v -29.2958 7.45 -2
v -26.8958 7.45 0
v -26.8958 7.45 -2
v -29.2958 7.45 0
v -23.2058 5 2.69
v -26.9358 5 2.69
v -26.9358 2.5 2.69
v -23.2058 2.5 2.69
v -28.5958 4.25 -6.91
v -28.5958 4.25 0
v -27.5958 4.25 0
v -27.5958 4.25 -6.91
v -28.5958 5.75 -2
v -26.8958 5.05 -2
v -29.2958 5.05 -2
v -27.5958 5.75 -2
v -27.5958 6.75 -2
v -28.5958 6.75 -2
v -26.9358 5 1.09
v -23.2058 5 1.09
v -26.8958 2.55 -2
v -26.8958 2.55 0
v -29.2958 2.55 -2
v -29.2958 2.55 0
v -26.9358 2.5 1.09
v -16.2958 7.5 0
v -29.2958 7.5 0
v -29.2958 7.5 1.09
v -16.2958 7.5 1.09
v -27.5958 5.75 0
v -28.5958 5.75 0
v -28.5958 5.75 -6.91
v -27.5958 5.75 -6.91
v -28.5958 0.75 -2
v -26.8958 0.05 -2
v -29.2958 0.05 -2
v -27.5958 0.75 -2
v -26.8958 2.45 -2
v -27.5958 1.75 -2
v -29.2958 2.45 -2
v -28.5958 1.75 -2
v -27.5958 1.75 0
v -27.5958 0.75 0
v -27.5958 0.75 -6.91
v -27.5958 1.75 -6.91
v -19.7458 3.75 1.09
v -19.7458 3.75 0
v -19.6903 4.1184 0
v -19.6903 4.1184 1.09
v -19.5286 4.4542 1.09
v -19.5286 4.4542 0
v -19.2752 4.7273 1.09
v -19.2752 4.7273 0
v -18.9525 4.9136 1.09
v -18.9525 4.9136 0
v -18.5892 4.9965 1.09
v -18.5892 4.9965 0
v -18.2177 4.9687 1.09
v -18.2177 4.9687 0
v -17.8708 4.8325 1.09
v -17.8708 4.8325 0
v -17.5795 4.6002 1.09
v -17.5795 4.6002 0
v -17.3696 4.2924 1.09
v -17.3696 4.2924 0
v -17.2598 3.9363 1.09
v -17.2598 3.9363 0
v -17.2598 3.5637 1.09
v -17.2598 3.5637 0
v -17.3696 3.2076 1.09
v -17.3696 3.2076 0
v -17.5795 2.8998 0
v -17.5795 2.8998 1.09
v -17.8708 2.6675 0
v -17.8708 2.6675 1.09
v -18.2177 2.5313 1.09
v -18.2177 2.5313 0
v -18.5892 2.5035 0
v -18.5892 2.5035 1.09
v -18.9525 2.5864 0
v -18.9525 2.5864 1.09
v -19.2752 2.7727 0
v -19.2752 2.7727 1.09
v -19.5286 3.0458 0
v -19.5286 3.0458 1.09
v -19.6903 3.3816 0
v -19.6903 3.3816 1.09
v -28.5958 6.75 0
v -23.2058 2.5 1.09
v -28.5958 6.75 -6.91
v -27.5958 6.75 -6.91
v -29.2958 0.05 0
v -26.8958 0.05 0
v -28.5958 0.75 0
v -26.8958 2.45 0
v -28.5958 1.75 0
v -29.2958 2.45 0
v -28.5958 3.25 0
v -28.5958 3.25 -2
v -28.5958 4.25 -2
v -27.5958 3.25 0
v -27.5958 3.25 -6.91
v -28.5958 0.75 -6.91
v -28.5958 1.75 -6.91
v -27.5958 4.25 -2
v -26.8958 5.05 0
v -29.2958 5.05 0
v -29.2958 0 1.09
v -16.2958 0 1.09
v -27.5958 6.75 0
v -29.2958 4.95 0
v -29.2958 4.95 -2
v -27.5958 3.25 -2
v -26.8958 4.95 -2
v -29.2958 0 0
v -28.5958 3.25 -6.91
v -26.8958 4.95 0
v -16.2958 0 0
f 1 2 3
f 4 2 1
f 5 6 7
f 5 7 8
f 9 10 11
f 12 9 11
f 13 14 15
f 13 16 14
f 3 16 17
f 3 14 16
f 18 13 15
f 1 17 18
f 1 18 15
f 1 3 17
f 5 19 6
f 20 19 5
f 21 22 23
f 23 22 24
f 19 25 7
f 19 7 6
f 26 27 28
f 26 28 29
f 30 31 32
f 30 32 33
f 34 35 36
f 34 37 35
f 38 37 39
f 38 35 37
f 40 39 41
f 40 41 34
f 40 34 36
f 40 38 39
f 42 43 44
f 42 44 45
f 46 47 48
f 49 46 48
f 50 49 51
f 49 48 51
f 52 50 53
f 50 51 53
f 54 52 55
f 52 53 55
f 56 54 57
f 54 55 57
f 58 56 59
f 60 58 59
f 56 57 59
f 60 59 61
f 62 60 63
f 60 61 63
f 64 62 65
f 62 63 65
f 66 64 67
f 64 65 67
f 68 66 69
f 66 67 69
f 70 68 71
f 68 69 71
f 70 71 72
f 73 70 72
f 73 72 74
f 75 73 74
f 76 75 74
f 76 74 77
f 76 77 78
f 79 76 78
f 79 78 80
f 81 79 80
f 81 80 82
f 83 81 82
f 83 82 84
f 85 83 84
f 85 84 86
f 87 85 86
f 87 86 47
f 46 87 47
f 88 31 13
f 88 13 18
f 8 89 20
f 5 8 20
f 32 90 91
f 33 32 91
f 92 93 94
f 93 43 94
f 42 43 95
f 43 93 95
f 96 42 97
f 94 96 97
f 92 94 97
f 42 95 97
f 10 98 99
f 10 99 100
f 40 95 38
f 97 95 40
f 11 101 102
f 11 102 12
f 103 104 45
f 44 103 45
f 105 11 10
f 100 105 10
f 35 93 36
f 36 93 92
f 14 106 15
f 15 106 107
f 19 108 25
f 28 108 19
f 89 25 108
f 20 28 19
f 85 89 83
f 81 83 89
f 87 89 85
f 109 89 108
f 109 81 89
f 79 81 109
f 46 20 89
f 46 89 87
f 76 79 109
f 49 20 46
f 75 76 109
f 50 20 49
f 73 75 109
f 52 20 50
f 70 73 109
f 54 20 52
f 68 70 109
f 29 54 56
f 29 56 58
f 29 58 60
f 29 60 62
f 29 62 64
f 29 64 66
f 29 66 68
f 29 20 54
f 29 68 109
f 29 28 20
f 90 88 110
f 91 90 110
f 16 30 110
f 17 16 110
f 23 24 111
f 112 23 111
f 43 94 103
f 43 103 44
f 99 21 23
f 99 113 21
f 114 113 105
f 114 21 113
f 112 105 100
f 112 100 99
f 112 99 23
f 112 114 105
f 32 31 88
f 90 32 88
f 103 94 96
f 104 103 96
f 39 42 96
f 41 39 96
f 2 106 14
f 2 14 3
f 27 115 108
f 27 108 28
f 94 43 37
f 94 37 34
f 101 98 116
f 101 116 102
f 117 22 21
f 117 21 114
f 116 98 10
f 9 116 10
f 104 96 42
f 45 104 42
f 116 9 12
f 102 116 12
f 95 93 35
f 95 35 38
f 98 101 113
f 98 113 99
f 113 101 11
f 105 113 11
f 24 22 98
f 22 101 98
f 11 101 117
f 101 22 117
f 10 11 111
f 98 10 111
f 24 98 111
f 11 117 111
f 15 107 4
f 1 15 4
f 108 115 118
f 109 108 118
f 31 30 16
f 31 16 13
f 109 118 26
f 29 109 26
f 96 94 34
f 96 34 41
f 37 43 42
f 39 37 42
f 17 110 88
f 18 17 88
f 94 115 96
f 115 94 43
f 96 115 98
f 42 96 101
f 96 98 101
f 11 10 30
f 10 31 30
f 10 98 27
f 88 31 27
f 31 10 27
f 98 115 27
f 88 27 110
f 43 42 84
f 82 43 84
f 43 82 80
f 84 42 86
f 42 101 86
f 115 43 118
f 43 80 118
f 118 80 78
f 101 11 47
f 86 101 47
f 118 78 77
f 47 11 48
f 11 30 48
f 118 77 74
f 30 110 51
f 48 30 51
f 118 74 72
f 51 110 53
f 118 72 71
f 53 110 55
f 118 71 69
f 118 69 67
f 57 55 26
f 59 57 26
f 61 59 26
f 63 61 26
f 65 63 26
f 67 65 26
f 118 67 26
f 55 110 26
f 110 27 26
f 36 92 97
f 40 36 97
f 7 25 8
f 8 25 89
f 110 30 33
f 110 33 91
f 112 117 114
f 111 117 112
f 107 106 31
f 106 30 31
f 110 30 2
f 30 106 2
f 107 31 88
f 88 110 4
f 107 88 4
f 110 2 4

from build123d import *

# Parameters (mm, degrees)
ESQUISSE1_W             = 13
ESQUISSE1_H             = 7.5
BOSS_EXTRU_3_DEPTH      = 1.09
ESQUISSE4_W             = 3.73
ESQUISSE4_H             = 2.5
BOSS_EXTRU_4_DEPTH      = 1.6
ESQUISSE5_W             = 1
ESQUISSE5_H             = 1
BOSS_EXTRU_5_DEPTH      = 8
ESQUISSE6_W             = 2.4
ESQUISSE6_H             = 2.4
ESQUISSE6_W_2           = 1
ESQUISSE6_H_2           = 1
BOSS_EXTRU_6_DEPTH      = 2
BOSS_EXTRU_6_2_DEPTH    = 2
BOSS_EXTRU_6_3_DEPTH    = 2
ESQUISSE7_R             = 1.25
ENL_V_MAT_EXTRU_1_DEPTH = 32.020050982


with BuildPart() as part:
    # Esquisse1 → Boss.-Extru.3 (new body)
    with BuildSketch(Plane.XY):
        with Locations((-22.795826716, 3.75)):
            Rectangle(ESQUISSE1_W, ESQUISSE1_H)
    extrude(amount=BOSS_EXTRU_3_DEPTH)

    # Esquisse4 → Boss.-Extru.4 (add)
    with BuildSketch(Plane.XY.offset(1.09)):
        with Locations((-25.070826716, 3.75)):
            Rectangle(ESQUISSE4_W, ESQUISSE4_H)
    extrude(amount=BOSS_EXTRU_4_DEPTH)

    # Esquisse5 → Boss.-Extru.5 (add)
    with BuildSketch(Plane.XY.offset(1.09)):
        with Locations((-28.095826716, 6.25)):
            Rectangle(ESQUISSE5_W, ESQUISSE5_H)
        with Locations((-28.095826716, 3.75)):
            Rectangle(ESQUISSE5_W, ESQUISSE5_H)
        with Locations((-28.095826716, 1.25)):
            Rectangle(ESQUISSE5_W, ESQUISSE5_H)
    extrude(amount=-BOSS_EXTRU_5_DEPTH)

    # Esquisse7 → Enlèv. mat.-Extru.1 (cut, through all)
    with BuildSketch(Plane(origin=(0, 0, 0), x_dir=(-1, 0, 0), z_dir=(0, 0, -1))):
        with Locations((18.495826716, 3.75)):
            Circle(ESQUISSE7_R)
    extrude(amount=-ENL_V_MAT_EXTRU_1_DEPTH, mode=Mode.SUBTRACT)


with BuildPart() as body_2:
    # Esquisse6 → Boss.-Extru.6 (new body)
    with BuildSketch(Plane(origin=(0, 0, 0), x_dir=(-1, 0, 0), z_dir=(0, 0, -1))):
        with Locations((28.095826716, 6.25)):
            Rectangle(ESQUISSE6_W, ESQUISSE6_H)
        with Locations((28.095826716, 6.25)):
            Rectangle(ESQUISSE6_W_2, ESQUISSE6_H_2, mode=Mode.SUBTRACT)
    extrude(amount=BOSS_EXTRU_6_DEPTH)


with BuildPart() as body_3:
    # Esquisse6 → Boss.-Extru.6 2 (new body)
    with BuildSketch(Plane(origin=(0, 0, 0), x_dir=(-1, 0, 0), z_dir=(0, 0, -1))):
        with Locations((28.095826716, 3.75)):
            Rectangle(ESQUISSE6_W, ESQUISSE6_H)
        with Locations((28.095826716, 3.75)):
            Rectangle(ESQUISSE6_W_2, ESQUISSE6_H_2, mode=Mode.SUBTRACT)
    extrude(amount=BOSS_EXTRU_6_2_DEPTH)


with BuildPart() as body_4:
    # Esquisse6 → Boss.-Extru.6 3 (new body)
    with BuildSketch(Plane(origin=(0, 0, 0), x_dir=(-1, 0, 0), z_dir=(0, 0, -1))):
        with Locations((28.095826716, 1.25)):
            Rectangle(ESQUISSE6_W, ESQUISSE6_H)
        with Locations((28.095826716, 1.25)):
            Rectangle(ESQUISSE6_W_2, ESQUISSE6_H_2, mode=Mode.SUBTRACT)
    extrude(amount=BOSS_EXTRU_6_3_DEPTH)


solid = Compound([part.part, body_2.part, body_3.part, body_4.part])
